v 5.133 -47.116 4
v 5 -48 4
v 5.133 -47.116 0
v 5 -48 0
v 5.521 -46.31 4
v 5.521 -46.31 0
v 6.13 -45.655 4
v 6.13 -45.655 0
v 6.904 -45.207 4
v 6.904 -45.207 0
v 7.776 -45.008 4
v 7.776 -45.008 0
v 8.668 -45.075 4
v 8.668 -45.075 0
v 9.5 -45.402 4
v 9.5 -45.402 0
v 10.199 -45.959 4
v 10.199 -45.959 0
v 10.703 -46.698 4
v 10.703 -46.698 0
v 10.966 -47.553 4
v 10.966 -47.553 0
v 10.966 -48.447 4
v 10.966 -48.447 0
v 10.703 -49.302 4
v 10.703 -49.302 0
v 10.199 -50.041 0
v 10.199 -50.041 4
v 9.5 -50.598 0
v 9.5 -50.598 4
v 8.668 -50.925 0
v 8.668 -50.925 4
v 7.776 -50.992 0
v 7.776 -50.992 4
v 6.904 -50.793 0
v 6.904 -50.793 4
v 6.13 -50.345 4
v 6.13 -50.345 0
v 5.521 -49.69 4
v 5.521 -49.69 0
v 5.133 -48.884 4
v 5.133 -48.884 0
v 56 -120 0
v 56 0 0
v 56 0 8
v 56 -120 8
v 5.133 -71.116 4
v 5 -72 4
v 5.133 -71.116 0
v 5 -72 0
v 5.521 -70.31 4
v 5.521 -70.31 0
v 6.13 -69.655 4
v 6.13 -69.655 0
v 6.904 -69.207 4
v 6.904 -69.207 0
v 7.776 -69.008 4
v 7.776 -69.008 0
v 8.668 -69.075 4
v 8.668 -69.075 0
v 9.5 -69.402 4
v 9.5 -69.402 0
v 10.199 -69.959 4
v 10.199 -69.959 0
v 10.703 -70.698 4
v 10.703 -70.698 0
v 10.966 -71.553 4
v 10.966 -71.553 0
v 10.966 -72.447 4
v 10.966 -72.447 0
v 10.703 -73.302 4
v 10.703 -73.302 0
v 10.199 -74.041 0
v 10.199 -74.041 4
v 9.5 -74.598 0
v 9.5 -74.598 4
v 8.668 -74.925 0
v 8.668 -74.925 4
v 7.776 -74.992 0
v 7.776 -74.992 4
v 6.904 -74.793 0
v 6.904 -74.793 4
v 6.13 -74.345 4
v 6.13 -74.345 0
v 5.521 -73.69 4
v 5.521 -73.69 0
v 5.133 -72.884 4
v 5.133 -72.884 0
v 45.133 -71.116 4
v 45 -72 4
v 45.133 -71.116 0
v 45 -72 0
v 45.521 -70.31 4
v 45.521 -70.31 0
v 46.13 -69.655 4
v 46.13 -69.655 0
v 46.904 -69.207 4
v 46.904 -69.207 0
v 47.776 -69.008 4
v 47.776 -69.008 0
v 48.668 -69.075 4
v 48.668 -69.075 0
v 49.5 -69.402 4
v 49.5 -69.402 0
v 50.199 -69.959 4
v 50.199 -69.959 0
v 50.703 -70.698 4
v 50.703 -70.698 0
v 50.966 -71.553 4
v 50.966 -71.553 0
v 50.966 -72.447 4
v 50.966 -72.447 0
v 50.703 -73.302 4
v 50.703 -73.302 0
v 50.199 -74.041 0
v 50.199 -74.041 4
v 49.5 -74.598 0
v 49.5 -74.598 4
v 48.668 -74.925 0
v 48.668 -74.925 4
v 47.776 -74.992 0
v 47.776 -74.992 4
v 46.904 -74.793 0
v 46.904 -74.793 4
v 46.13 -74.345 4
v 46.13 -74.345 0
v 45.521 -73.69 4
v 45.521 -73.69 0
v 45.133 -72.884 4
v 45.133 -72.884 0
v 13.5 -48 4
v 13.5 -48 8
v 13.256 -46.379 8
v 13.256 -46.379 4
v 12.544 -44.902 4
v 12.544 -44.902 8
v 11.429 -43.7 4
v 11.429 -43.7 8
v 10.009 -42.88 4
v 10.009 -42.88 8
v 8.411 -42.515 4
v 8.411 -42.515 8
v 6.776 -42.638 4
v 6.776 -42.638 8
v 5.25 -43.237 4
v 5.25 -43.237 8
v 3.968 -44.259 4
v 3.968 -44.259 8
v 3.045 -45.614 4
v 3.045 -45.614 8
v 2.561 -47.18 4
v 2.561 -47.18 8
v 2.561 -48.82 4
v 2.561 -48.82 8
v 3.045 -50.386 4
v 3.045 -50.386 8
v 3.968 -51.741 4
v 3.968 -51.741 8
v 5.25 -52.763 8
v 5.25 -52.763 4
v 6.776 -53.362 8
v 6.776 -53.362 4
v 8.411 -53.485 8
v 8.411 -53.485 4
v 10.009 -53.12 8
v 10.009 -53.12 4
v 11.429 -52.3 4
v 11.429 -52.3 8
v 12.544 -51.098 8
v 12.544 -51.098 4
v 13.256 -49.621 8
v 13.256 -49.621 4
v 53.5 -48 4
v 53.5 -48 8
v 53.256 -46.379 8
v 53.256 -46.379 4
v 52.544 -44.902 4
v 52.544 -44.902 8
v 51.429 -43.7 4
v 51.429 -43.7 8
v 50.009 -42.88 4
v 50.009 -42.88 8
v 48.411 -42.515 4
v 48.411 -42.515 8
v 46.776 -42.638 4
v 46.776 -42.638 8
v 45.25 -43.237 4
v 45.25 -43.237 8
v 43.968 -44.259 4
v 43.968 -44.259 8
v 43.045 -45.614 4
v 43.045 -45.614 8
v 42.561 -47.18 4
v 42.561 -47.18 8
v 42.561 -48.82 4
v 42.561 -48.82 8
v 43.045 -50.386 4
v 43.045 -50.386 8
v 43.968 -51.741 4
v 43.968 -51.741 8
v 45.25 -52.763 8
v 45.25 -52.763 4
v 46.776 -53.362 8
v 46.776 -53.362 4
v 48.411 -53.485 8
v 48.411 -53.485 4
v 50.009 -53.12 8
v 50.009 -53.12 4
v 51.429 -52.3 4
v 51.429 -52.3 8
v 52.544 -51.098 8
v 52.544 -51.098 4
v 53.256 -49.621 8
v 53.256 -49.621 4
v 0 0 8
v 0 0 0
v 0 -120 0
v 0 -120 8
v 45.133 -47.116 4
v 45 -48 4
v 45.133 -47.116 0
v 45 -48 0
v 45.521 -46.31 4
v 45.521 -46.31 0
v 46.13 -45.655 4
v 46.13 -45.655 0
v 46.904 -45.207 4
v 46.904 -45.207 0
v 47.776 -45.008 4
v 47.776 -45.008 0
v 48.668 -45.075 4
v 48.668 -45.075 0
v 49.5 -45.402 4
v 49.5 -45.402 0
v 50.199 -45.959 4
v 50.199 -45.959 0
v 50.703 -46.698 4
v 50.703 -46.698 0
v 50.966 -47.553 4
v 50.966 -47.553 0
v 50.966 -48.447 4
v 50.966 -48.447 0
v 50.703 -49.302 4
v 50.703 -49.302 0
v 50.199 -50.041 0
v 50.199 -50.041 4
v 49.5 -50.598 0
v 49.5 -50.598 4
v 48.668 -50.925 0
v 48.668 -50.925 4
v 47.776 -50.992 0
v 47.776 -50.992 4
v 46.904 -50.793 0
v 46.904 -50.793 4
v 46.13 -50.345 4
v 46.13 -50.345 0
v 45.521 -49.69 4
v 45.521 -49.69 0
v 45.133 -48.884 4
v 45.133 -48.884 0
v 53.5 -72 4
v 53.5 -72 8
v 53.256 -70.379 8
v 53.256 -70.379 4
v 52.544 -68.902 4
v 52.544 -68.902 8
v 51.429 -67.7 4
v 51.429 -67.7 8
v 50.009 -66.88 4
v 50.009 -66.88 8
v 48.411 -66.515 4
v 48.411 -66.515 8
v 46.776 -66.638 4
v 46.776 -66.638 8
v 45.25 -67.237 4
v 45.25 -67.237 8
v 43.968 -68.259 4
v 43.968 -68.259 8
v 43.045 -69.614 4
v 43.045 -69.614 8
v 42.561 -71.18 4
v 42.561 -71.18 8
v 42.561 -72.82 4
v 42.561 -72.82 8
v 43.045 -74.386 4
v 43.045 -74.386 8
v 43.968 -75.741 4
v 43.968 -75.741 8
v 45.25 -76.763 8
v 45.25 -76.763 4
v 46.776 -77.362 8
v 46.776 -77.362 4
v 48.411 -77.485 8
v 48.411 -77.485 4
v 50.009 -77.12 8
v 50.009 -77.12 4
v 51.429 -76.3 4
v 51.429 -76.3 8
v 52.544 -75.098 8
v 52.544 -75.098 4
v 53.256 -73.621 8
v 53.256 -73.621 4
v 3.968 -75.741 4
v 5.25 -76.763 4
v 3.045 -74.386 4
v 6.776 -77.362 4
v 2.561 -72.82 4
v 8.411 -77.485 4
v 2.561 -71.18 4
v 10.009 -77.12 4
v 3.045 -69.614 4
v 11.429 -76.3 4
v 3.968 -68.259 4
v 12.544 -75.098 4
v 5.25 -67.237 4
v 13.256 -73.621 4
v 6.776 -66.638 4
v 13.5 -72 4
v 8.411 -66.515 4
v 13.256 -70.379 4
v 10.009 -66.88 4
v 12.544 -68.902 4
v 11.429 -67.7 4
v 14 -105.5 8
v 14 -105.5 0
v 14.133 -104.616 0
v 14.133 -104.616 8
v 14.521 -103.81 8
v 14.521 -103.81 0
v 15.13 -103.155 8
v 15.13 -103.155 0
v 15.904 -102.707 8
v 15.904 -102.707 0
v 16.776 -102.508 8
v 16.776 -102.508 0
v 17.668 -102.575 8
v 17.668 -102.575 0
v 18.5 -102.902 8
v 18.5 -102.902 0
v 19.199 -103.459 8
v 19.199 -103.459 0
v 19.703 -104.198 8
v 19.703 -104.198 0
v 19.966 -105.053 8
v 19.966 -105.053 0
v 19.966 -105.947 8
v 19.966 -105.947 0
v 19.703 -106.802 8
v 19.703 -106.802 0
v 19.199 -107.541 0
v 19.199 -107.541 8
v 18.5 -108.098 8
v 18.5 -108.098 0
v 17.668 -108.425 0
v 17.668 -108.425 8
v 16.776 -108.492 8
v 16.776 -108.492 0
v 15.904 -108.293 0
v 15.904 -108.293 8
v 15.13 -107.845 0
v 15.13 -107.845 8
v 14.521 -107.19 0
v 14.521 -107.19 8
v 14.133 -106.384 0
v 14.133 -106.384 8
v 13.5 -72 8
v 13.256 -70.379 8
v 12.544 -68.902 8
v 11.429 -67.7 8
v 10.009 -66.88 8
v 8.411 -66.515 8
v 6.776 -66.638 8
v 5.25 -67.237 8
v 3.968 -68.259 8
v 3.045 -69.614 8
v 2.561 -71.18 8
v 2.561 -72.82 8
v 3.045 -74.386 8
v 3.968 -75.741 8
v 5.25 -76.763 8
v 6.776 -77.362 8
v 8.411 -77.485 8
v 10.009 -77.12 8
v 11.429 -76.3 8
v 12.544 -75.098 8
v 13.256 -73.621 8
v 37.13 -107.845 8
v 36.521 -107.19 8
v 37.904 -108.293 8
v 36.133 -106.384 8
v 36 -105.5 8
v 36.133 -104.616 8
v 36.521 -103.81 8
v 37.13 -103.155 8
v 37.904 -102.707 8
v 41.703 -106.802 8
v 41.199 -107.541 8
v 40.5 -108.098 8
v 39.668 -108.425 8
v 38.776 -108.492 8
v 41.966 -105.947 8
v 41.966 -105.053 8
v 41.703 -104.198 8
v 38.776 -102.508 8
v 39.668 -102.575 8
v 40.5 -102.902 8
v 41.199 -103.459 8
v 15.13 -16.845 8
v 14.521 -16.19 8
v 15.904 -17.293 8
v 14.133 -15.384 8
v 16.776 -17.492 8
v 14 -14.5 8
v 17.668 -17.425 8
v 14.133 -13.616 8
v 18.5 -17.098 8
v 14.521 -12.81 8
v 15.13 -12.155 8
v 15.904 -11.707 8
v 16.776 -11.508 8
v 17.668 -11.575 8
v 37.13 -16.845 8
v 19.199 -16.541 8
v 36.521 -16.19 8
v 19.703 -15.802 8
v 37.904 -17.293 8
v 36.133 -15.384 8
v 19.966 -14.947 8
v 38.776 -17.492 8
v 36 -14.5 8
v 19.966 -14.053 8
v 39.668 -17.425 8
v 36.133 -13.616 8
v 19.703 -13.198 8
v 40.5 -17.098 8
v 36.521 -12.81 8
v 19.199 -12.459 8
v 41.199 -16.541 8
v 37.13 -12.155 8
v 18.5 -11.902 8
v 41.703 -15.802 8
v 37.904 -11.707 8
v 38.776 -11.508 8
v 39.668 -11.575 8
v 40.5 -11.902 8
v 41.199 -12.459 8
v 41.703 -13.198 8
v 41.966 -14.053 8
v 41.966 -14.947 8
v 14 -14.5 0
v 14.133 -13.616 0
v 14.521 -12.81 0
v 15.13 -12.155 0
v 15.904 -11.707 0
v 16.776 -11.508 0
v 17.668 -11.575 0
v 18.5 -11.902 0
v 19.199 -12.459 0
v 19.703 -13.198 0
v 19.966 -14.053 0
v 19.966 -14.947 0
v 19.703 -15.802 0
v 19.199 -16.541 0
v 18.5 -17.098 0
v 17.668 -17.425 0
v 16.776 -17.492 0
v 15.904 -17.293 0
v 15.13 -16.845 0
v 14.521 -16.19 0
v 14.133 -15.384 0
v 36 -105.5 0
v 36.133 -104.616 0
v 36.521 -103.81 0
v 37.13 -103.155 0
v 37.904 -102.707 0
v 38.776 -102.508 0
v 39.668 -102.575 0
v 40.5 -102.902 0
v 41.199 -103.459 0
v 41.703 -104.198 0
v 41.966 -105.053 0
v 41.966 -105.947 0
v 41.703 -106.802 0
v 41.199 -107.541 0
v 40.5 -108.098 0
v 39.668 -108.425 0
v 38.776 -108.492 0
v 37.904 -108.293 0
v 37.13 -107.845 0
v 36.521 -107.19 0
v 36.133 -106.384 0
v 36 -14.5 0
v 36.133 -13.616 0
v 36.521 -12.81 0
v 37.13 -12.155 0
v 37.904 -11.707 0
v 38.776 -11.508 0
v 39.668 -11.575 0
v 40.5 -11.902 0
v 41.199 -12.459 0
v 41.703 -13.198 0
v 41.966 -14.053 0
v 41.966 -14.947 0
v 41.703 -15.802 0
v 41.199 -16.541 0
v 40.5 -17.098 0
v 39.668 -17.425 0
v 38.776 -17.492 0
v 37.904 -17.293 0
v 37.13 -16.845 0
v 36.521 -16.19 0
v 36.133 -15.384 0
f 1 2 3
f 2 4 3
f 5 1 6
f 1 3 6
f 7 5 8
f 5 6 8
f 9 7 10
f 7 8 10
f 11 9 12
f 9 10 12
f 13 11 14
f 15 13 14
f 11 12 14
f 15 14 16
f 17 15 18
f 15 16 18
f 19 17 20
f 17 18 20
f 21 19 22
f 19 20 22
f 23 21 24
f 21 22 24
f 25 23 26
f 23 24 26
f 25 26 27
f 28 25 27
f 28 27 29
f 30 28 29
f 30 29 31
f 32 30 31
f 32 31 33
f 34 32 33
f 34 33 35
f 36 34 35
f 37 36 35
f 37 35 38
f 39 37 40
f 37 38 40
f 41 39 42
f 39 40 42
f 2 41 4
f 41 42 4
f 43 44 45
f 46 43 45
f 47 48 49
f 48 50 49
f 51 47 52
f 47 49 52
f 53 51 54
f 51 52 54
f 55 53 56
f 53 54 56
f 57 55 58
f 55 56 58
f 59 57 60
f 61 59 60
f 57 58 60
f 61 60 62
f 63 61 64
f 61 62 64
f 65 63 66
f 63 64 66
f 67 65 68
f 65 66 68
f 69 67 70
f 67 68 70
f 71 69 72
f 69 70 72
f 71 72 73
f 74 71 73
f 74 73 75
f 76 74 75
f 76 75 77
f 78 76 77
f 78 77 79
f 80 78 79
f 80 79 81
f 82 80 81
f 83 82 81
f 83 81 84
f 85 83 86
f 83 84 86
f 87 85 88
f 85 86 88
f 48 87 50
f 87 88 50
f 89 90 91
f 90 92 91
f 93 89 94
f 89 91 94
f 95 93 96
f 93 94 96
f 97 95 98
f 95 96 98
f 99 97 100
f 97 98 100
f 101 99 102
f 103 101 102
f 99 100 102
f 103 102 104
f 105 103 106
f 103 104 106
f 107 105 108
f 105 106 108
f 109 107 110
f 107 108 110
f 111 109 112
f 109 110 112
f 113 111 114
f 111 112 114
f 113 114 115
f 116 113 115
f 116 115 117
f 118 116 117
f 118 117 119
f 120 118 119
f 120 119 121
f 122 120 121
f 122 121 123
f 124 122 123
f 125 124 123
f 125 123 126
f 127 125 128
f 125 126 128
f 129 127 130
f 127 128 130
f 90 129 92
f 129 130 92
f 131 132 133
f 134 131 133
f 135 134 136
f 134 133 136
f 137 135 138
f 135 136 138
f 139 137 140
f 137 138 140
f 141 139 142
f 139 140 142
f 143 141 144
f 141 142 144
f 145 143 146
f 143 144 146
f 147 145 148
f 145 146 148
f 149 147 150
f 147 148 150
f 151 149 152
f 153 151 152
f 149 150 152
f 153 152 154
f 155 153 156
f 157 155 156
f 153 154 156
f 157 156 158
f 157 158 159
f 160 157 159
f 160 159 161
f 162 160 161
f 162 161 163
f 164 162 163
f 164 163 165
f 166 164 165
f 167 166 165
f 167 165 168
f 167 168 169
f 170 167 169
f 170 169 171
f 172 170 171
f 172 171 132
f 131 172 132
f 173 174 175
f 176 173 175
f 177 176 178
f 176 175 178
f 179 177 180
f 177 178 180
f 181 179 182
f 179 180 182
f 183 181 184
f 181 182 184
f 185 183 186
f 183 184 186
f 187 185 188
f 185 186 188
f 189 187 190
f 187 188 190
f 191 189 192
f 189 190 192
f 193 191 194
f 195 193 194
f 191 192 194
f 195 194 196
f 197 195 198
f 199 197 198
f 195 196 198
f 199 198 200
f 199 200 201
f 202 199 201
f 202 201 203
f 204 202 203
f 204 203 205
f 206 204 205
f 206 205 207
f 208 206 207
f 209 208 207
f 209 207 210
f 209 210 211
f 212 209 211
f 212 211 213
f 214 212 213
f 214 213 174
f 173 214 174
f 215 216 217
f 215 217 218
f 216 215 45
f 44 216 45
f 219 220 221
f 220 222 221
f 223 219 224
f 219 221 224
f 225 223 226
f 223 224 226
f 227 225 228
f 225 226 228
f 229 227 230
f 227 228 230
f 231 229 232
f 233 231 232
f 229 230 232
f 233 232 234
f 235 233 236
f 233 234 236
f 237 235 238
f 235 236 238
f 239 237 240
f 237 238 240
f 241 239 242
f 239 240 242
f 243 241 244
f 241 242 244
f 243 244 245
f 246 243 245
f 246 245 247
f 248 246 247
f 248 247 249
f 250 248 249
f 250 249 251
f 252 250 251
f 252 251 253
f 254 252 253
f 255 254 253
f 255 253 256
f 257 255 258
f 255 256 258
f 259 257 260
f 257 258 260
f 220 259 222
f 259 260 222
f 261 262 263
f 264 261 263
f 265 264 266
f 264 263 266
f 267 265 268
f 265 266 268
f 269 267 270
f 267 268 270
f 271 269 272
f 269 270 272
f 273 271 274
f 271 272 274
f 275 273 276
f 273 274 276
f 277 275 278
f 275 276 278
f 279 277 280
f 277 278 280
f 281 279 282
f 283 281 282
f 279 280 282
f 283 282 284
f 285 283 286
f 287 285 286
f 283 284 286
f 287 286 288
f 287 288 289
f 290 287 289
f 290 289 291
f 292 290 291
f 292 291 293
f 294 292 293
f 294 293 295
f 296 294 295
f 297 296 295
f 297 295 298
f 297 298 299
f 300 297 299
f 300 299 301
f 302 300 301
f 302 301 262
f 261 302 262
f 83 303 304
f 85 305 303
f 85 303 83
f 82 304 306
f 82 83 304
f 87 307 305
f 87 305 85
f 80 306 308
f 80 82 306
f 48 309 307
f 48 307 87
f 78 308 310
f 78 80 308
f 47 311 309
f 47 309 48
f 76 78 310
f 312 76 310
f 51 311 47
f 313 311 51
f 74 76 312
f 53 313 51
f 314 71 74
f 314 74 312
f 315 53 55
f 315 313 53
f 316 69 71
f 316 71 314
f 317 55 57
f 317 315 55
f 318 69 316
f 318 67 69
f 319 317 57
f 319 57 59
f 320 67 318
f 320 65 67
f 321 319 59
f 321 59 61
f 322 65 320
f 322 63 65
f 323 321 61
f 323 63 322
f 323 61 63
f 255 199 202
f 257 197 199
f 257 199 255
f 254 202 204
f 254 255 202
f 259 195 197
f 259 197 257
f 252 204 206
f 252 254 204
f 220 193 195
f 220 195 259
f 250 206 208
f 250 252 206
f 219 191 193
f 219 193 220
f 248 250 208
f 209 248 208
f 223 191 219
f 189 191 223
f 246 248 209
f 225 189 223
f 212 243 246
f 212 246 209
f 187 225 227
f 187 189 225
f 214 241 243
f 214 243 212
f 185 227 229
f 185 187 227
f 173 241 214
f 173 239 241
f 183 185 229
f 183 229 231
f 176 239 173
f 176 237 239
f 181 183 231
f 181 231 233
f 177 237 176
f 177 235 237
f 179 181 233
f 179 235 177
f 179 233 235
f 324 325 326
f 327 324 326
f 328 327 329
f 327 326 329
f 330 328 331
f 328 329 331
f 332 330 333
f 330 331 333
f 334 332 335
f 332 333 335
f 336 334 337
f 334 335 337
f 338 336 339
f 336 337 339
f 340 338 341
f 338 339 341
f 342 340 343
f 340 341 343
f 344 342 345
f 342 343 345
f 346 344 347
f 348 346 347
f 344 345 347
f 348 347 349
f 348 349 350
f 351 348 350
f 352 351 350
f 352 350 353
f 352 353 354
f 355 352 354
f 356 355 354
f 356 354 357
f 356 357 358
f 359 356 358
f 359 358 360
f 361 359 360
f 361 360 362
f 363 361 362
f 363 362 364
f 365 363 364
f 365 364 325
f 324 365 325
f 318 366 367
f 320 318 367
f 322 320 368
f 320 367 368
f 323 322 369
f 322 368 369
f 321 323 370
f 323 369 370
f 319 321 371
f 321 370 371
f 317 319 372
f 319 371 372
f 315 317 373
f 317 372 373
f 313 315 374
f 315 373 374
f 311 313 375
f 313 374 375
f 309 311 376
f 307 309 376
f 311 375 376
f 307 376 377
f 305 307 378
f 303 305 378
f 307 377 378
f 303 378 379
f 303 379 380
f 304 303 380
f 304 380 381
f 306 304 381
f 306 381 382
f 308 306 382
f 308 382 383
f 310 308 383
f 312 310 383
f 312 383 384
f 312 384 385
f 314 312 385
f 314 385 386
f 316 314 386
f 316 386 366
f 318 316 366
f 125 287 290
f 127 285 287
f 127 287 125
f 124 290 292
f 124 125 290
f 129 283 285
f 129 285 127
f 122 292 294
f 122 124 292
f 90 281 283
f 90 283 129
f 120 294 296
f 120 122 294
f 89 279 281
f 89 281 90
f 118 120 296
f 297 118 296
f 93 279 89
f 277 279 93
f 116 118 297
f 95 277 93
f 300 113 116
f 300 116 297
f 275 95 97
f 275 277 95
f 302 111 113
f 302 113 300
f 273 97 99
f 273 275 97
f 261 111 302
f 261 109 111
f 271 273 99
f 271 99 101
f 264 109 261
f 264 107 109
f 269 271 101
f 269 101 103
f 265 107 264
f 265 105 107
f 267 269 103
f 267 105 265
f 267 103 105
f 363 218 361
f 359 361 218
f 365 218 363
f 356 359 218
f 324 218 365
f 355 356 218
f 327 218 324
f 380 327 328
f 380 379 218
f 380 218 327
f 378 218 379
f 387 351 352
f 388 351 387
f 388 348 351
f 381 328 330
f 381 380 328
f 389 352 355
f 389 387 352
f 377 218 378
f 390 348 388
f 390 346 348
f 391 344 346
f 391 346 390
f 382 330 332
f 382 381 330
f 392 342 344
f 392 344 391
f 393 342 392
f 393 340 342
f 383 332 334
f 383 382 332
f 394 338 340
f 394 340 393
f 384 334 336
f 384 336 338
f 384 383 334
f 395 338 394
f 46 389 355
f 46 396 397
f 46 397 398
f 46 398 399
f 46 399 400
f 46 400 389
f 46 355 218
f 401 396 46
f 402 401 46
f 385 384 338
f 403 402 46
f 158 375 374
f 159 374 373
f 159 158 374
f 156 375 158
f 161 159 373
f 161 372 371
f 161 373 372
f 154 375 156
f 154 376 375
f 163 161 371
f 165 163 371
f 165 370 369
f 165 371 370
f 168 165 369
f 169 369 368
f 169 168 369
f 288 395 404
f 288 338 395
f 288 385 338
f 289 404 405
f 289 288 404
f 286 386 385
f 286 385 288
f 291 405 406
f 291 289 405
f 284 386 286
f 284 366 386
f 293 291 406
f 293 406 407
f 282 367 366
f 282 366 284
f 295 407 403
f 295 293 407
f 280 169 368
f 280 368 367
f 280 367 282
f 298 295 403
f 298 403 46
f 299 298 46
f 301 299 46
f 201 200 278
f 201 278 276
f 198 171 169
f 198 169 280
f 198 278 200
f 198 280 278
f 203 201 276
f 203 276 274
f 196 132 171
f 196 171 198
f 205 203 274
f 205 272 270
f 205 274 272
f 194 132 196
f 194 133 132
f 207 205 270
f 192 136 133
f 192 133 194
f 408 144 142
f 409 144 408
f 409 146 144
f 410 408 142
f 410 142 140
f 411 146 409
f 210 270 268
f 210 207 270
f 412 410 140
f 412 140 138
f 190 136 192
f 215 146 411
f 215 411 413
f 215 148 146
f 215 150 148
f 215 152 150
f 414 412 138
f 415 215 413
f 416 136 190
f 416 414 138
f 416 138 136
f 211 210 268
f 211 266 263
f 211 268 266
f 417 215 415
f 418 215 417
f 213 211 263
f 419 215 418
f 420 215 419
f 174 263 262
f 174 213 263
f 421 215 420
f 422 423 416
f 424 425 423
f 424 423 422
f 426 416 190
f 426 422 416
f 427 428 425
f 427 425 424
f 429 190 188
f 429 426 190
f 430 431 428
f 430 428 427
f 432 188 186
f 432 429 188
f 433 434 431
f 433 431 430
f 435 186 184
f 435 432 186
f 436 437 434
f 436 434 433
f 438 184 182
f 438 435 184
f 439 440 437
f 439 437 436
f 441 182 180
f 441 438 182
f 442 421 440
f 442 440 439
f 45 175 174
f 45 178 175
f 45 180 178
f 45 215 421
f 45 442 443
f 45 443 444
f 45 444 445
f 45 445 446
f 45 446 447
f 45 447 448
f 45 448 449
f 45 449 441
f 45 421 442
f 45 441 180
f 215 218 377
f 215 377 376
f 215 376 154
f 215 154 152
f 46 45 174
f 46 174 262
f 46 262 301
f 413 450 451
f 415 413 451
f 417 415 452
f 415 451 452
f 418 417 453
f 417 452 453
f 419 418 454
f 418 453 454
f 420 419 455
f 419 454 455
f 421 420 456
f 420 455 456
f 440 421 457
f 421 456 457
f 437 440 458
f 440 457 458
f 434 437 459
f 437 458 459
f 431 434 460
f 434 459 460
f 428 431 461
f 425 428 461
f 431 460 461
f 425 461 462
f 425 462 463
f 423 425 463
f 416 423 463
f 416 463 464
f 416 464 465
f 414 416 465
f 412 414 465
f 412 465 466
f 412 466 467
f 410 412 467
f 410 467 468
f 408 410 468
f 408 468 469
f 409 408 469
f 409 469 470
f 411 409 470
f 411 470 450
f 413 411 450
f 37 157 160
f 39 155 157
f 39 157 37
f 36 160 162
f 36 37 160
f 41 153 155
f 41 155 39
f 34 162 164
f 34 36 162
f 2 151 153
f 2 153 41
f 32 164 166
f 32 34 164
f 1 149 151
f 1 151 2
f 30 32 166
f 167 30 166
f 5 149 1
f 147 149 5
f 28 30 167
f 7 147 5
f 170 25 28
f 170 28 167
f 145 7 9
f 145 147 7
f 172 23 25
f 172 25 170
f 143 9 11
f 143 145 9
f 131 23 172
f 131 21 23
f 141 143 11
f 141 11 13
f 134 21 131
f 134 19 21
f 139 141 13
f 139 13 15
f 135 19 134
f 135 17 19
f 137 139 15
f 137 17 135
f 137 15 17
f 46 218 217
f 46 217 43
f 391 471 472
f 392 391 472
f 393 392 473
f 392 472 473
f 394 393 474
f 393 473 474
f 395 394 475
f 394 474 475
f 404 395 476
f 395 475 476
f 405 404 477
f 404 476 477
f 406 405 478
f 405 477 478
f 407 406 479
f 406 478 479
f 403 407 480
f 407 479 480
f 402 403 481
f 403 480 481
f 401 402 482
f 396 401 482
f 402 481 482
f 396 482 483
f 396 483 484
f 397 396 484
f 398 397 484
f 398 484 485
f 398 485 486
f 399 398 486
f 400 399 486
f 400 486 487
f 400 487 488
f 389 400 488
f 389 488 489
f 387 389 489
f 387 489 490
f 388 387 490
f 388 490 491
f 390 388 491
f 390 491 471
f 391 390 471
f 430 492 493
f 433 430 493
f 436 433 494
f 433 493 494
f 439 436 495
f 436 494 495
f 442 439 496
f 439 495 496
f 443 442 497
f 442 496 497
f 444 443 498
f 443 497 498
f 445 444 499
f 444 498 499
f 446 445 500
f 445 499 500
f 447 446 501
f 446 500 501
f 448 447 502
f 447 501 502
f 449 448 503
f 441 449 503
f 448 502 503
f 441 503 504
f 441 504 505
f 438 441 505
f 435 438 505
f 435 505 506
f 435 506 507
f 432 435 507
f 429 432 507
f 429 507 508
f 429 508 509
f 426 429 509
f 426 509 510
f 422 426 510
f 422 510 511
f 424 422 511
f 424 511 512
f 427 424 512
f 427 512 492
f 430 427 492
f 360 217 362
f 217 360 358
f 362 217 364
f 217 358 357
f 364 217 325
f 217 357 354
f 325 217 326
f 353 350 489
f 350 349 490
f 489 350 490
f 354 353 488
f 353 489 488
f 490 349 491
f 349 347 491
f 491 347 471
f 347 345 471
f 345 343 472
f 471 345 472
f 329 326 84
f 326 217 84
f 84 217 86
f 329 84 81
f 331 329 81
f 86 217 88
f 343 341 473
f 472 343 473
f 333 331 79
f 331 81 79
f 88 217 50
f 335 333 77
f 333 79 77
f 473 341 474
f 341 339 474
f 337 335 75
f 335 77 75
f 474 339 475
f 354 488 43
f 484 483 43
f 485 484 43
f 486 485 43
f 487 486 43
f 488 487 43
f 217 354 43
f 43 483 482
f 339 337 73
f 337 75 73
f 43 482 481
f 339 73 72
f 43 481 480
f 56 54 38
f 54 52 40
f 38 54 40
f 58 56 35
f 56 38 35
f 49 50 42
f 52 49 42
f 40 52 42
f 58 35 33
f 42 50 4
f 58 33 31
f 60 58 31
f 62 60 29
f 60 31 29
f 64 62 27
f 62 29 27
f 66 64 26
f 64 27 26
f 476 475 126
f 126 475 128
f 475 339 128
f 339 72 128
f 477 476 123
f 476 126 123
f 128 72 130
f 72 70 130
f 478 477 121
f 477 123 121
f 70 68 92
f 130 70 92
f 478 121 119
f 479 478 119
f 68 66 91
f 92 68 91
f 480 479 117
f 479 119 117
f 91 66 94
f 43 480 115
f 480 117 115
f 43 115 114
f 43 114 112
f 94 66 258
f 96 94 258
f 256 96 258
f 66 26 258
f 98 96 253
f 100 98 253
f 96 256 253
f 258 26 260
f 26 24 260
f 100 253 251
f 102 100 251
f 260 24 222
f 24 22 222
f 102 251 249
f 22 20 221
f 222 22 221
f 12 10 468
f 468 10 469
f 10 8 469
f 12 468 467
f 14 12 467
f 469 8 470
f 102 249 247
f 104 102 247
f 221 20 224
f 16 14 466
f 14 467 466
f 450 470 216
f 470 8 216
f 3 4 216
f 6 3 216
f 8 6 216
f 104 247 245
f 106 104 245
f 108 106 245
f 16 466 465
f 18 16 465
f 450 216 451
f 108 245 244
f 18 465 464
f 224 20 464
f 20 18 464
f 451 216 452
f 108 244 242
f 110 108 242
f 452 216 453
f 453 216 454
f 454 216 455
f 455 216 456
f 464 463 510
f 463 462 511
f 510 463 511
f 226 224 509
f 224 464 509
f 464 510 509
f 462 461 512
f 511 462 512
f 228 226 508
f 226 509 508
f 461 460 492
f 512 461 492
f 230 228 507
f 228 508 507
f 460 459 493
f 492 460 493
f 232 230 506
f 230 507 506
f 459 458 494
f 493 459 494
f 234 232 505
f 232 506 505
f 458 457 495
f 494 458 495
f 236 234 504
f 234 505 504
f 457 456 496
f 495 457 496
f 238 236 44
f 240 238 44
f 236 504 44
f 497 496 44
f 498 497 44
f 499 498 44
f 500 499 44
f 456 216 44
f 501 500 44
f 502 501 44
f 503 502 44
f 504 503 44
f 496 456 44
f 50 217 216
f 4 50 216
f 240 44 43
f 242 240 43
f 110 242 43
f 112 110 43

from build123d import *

# Parameters (mm, degrees)
F0_W           = 56
F0_H           = 8
F1_DEPTH       = 120
F3_D           = 6
F5_D           = 6
F5_CBORE_D     = 11
F5_CBORE_DEPTH = 4


with BuildPart() as f1:
    # F0 (on Front) → F1 (new body)
    with BuildSketch(Plane.XZ):
        with Locations((28, 4)):
            Rectangle(F0_W, F0_H)
    extrude(amount=F1_DEPTH)

    # F3 (through all)
    with Locations(Plane.XY.offset(8)):
        with Locations((17, -14.5), (39, -14.5), (17, -105.5), (39, -105.5)):
            Hole(F3_D / 2)

    # F5 (through all)
    with Locations(Plane.XY.offset(8)):
        with Locations((8, -48), (8, -72), (48, -48), (48, -72)):
            CounterBoreHole(F5_D / 2, F5_CBORE_D / 2, F5_CBORE_DEPTH)


solid = f1.part
